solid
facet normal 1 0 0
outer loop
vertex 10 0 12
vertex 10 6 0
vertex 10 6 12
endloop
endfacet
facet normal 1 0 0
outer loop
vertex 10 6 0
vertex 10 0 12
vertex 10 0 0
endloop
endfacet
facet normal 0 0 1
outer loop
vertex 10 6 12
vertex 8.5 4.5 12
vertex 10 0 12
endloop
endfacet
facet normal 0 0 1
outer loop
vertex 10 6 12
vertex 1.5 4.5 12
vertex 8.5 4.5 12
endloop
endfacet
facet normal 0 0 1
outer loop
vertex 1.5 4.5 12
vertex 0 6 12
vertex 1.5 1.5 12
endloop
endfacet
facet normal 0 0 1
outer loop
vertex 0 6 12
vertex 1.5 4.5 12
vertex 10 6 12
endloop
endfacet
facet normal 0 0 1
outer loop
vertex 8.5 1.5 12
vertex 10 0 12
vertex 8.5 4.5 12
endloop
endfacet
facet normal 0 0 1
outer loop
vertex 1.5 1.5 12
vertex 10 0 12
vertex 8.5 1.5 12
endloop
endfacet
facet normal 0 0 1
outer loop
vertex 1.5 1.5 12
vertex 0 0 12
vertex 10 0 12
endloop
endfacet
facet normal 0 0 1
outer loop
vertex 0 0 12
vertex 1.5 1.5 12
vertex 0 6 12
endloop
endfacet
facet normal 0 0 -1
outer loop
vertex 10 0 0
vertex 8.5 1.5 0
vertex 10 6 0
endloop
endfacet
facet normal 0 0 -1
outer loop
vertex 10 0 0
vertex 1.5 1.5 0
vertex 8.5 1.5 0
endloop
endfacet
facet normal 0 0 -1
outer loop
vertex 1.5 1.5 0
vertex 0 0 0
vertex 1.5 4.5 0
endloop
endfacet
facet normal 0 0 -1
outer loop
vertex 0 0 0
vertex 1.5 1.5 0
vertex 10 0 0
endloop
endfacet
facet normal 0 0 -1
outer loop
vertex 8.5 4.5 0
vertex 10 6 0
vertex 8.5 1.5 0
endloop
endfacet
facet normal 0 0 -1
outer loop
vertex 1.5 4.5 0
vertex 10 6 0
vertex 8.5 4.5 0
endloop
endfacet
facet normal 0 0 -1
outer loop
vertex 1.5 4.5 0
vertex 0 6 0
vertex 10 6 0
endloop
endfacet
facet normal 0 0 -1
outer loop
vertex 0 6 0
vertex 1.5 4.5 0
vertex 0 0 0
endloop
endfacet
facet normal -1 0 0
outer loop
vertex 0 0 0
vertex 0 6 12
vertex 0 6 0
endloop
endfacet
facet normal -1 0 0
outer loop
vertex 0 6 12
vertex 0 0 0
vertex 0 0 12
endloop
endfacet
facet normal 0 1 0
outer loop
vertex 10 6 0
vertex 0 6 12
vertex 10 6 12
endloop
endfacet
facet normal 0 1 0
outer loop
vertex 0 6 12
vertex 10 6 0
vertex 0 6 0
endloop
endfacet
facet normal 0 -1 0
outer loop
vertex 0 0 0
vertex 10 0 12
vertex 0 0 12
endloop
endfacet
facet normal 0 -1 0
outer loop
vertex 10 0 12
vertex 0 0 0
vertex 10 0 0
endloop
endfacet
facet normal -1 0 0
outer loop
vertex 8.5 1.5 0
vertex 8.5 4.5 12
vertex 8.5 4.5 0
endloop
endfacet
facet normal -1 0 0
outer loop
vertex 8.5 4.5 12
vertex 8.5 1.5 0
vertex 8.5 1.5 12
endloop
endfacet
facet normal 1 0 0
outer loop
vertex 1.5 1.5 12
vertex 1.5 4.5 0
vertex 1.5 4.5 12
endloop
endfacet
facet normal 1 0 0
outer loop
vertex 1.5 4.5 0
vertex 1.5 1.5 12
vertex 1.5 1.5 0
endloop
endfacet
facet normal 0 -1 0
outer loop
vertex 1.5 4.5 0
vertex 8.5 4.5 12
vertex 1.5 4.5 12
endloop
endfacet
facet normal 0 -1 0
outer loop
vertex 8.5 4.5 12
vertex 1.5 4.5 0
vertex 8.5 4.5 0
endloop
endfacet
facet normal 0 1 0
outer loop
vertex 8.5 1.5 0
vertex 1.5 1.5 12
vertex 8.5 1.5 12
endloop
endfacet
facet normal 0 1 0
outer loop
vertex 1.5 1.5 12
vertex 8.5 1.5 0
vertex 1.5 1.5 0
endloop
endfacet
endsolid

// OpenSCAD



thickness=1.5;
height=12;
innerwidth=7;
innerdepth=3;

difference()
{
cube([innerwidth+thickness*2,innerdepth+thickness*2,height]);
    
translate([thickness,thickness,0]) cube([innerwidth,innerdepth,height]);
}
